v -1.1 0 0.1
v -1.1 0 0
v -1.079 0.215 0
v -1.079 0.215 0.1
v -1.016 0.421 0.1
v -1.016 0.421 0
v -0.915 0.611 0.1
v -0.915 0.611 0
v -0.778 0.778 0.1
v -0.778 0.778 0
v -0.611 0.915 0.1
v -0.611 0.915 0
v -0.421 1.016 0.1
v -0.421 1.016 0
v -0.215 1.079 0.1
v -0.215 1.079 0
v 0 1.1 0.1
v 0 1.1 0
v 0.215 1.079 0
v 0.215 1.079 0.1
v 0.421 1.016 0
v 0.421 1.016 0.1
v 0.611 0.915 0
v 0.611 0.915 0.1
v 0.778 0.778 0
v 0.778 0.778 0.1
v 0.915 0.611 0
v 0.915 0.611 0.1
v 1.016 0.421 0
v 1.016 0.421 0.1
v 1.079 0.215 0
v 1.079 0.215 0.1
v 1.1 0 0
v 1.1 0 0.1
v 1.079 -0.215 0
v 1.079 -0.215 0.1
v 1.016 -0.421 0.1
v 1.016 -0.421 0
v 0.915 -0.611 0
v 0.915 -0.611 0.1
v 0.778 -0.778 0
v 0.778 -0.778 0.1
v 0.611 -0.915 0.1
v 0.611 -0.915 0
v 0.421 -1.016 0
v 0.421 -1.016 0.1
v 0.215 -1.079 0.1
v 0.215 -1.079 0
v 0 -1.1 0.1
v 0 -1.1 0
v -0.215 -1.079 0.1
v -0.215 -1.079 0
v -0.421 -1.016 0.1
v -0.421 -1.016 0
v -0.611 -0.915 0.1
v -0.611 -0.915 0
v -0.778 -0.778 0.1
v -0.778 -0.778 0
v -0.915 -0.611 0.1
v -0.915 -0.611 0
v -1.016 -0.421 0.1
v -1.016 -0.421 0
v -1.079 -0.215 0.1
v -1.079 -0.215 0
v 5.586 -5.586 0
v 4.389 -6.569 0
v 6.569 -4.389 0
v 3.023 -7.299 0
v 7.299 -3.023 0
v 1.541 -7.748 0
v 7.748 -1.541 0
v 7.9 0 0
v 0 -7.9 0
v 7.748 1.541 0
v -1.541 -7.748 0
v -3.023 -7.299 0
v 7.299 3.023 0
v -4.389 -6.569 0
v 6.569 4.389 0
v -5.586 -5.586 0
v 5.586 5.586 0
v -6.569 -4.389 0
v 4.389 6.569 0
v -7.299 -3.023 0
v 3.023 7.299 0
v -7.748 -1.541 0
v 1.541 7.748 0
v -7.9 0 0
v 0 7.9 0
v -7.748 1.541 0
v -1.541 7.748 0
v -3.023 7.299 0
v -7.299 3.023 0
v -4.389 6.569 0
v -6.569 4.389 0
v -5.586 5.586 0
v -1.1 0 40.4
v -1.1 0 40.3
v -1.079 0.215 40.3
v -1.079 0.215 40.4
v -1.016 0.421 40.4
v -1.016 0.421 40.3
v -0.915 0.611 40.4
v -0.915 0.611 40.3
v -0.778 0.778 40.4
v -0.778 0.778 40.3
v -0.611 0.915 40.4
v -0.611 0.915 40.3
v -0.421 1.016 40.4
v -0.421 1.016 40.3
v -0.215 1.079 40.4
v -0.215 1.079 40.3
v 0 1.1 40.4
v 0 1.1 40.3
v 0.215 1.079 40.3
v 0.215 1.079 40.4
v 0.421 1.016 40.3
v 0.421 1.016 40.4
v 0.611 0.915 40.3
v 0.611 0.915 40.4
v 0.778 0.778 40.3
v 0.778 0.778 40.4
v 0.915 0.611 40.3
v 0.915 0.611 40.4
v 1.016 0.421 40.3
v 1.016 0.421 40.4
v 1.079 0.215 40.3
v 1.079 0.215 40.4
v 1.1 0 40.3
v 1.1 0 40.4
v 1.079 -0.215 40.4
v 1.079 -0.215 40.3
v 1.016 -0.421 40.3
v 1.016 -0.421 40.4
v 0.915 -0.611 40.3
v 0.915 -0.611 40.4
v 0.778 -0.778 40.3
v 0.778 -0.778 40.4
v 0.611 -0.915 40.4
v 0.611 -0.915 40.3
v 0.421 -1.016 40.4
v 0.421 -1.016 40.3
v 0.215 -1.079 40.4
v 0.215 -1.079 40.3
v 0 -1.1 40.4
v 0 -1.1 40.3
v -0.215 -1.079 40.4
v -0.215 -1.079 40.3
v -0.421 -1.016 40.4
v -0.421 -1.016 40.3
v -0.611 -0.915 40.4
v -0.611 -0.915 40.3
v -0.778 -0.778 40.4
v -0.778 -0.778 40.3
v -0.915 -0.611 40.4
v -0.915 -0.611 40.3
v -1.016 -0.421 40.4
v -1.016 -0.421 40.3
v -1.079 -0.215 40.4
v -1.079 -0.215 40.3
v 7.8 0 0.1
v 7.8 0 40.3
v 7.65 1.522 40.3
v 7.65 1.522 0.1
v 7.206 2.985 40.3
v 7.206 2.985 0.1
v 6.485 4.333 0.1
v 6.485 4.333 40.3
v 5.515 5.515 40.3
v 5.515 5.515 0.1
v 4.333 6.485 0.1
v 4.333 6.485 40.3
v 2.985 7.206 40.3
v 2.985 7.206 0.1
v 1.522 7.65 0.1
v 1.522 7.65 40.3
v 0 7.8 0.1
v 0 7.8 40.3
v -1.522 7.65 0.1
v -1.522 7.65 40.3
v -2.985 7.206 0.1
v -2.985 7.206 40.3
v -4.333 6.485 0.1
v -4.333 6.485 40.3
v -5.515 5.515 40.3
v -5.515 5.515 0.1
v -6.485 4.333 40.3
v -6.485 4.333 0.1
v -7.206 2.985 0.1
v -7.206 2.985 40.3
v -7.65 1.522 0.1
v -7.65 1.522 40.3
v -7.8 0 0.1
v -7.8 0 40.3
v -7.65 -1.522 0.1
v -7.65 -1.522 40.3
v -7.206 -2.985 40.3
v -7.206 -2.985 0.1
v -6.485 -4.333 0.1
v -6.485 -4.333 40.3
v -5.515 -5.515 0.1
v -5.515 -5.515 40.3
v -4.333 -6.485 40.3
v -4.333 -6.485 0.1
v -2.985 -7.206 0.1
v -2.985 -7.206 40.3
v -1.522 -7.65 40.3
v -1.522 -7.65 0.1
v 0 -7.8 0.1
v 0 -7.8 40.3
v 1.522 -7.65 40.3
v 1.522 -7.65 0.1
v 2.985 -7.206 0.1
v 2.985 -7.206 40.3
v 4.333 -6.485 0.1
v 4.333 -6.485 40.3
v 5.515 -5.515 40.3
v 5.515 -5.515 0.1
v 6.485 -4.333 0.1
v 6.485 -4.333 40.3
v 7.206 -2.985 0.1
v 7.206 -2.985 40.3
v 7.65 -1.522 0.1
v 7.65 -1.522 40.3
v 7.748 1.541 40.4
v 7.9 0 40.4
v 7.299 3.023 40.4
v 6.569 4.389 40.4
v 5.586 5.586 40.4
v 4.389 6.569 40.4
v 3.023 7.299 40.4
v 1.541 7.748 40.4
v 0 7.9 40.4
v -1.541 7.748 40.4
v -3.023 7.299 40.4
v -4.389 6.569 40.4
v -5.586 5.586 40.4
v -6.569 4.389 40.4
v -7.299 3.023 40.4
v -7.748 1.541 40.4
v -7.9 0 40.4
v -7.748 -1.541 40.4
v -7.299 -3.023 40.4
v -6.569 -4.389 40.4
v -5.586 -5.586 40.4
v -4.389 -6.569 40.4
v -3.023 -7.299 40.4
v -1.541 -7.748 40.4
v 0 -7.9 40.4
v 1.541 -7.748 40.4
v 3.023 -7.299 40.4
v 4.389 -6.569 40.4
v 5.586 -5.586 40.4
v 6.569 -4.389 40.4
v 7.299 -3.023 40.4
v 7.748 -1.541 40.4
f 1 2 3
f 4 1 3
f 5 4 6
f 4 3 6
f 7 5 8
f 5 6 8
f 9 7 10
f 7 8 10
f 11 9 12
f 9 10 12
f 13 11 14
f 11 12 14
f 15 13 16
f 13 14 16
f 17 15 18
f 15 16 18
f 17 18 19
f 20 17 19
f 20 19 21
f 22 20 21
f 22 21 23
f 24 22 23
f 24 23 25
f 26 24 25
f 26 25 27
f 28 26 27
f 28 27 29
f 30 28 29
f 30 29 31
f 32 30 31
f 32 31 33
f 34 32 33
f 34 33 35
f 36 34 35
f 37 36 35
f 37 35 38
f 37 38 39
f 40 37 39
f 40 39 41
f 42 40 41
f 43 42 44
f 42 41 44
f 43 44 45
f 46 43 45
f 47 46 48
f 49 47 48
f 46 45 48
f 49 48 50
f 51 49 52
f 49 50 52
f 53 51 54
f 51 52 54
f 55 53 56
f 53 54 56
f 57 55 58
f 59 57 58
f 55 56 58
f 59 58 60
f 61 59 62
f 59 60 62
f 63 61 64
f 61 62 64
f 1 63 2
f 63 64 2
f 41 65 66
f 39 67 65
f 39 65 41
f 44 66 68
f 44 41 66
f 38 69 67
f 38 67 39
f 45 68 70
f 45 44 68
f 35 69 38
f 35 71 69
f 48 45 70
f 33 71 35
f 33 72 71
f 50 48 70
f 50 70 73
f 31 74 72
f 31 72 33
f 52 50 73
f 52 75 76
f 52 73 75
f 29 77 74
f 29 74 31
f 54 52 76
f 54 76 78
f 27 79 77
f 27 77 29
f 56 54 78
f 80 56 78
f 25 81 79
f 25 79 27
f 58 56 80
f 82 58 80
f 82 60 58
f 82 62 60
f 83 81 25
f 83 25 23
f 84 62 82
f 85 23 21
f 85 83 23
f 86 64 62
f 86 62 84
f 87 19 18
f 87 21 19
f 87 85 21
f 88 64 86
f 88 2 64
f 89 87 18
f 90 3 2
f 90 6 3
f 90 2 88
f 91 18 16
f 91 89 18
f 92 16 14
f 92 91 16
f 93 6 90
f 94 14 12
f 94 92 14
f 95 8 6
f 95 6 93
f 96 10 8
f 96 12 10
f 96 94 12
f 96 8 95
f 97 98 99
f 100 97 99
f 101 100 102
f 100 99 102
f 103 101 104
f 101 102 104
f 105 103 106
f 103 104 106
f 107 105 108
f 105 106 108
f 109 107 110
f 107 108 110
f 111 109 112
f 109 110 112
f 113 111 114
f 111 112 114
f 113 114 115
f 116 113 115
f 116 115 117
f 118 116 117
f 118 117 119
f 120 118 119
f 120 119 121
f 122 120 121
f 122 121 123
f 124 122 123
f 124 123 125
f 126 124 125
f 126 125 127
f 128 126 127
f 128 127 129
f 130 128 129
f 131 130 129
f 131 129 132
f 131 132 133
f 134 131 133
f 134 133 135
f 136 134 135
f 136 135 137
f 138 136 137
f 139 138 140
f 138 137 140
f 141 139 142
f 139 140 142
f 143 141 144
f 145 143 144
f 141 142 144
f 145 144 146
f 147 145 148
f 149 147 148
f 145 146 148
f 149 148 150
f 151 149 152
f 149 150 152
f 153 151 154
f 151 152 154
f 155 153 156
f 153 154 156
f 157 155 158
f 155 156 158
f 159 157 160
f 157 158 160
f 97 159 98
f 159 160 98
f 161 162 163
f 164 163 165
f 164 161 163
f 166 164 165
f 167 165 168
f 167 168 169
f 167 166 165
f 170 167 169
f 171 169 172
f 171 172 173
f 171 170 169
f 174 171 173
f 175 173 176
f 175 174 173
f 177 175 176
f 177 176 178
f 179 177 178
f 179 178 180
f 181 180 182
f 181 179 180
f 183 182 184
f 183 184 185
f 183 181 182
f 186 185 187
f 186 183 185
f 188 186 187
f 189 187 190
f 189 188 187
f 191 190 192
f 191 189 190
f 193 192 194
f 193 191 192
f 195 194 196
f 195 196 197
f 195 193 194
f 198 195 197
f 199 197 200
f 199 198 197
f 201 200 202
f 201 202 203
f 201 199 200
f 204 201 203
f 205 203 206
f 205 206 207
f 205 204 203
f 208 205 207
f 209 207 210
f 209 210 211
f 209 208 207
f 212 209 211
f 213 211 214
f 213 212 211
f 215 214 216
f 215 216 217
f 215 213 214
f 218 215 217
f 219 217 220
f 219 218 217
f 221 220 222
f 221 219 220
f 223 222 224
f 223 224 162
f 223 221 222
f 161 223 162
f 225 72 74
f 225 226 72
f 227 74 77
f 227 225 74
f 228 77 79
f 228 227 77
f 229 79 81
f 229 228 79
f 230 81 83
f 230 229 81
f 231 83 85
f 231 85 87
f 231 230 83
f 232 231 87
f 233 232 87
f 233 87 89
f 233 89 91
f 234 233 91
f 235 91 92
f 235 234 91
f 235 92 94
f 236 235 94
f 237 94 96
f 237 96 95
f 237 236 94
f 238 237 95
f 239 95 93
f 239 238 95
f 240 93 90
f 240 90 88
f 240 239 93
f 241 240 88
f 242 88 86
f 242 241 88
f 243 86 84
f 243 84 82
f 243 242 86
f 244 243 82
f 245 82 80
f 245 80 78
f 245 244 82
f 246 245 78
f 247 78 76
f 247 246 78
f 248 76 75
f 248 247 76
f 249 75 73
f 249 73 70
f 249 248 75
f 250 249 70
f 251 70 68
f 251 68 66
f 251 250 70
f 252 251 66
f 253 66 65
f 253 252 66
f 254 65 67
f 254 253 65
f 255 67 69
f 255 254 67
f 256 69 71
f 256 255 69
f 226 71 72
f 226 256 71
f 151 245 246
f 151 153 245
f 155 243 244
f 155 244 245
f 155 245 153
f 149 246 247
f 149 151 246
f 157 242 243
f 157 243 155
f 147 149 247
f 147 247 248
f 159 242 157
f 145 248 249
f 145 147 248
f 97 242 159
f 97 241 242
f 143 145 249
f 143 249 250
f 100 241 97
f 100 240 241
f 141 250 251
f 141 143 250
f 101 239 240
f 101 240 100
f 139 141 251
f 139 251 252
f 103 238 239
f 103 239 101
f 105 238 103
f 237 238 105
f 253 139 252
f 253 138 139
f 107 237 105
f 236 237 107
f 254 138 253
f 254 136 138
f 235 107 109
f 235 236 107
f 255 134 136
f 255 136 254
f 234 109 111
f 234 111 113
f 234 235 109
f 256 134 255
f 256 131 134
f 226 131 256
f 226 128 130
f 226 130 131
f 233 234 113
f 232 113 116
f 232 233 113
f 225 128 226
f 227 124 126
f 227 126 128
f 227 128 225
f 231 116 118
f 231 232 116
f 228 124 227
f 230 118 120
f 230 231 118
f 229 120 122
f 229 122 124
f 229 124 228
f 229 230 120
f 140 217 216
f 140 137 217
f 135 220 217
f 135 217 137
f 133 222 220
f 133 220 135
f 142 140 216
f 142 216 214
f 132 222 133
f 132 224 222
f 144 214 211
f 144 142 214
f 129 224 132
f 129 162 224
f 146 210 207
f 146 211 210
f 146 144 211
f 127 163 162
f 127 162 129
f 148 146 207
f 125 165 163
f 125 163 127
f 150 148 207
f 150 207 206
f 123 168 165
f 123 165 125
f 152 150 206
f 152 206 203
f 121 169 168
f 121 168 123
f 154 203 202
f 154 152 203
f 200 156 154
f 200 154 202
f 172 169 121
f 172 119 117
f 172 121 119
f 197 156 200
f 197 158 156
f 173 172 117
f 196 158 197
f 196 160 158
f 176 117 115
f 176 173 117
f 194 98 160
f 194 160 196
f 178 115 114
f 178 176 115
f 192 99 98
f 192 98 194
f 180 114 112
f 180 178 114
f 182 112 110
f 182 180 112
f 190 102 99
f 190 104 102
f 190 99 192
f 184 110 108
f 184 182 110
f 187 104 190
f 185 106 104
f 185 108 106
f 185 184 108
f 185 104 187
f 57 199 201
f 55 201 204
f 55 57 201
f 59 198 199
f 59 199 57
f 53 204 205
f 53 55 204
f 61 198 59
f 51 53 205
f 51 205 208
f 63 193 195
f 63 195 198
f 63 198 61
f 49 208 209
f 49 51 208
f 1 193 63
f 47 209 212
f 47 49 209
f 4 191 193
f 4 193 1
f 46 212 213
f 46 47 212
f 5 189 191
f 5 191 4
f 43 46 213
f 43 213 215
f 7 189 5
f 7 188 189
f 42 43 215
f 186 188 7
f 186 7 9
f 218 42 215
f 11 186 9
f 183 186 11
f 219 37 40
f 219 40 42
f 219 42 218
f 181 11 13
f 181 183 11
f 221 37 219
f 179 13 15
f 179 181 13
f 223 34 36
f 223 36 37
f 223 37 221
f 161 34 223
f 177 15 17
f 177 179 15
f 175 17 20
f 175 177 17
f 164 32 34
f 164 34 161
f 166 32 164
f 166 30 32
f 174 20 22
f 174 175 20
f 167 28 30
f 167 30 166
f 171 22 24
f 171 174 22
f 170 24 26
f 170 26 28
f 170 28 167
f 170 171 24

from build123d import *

# Parameters (mm, degrees)
SKETCH3_R          = 1.1
CUT_EXTRUDE1_DEPTH = 53


# Read off the part's stored shape, not the designer's step: Extrude-Thin1
with BuildPart() as part:
    # Extrude-Thin1 outline → Extrude-Thin1 (revolve)
    with BuildSketch(Plane.XZ):
        Polygon((7.9, 40.4), (0, 40.4), (0, 40.3), (7.8, 40.3), (7.8, 0.1), (0, 0.1), (0, 0), (7.9, 0), align=None)
    revolve(axis=Axis((0, 0, 0), (0, 0, 1)))

    # Sketch3 → Cut-Extrude1 (cut)
    with BuildSketch(Plane(origin=(0, 0, 0), x_dir=(-1, 0, 0), z_dir=(0, 0, -1))):
        Circle(SKETCH3_R)
    extrude(amount=-CUT_EXTRUDE1_DEPTH, mode=Mode.SUBTRACT)


solid = part.part
